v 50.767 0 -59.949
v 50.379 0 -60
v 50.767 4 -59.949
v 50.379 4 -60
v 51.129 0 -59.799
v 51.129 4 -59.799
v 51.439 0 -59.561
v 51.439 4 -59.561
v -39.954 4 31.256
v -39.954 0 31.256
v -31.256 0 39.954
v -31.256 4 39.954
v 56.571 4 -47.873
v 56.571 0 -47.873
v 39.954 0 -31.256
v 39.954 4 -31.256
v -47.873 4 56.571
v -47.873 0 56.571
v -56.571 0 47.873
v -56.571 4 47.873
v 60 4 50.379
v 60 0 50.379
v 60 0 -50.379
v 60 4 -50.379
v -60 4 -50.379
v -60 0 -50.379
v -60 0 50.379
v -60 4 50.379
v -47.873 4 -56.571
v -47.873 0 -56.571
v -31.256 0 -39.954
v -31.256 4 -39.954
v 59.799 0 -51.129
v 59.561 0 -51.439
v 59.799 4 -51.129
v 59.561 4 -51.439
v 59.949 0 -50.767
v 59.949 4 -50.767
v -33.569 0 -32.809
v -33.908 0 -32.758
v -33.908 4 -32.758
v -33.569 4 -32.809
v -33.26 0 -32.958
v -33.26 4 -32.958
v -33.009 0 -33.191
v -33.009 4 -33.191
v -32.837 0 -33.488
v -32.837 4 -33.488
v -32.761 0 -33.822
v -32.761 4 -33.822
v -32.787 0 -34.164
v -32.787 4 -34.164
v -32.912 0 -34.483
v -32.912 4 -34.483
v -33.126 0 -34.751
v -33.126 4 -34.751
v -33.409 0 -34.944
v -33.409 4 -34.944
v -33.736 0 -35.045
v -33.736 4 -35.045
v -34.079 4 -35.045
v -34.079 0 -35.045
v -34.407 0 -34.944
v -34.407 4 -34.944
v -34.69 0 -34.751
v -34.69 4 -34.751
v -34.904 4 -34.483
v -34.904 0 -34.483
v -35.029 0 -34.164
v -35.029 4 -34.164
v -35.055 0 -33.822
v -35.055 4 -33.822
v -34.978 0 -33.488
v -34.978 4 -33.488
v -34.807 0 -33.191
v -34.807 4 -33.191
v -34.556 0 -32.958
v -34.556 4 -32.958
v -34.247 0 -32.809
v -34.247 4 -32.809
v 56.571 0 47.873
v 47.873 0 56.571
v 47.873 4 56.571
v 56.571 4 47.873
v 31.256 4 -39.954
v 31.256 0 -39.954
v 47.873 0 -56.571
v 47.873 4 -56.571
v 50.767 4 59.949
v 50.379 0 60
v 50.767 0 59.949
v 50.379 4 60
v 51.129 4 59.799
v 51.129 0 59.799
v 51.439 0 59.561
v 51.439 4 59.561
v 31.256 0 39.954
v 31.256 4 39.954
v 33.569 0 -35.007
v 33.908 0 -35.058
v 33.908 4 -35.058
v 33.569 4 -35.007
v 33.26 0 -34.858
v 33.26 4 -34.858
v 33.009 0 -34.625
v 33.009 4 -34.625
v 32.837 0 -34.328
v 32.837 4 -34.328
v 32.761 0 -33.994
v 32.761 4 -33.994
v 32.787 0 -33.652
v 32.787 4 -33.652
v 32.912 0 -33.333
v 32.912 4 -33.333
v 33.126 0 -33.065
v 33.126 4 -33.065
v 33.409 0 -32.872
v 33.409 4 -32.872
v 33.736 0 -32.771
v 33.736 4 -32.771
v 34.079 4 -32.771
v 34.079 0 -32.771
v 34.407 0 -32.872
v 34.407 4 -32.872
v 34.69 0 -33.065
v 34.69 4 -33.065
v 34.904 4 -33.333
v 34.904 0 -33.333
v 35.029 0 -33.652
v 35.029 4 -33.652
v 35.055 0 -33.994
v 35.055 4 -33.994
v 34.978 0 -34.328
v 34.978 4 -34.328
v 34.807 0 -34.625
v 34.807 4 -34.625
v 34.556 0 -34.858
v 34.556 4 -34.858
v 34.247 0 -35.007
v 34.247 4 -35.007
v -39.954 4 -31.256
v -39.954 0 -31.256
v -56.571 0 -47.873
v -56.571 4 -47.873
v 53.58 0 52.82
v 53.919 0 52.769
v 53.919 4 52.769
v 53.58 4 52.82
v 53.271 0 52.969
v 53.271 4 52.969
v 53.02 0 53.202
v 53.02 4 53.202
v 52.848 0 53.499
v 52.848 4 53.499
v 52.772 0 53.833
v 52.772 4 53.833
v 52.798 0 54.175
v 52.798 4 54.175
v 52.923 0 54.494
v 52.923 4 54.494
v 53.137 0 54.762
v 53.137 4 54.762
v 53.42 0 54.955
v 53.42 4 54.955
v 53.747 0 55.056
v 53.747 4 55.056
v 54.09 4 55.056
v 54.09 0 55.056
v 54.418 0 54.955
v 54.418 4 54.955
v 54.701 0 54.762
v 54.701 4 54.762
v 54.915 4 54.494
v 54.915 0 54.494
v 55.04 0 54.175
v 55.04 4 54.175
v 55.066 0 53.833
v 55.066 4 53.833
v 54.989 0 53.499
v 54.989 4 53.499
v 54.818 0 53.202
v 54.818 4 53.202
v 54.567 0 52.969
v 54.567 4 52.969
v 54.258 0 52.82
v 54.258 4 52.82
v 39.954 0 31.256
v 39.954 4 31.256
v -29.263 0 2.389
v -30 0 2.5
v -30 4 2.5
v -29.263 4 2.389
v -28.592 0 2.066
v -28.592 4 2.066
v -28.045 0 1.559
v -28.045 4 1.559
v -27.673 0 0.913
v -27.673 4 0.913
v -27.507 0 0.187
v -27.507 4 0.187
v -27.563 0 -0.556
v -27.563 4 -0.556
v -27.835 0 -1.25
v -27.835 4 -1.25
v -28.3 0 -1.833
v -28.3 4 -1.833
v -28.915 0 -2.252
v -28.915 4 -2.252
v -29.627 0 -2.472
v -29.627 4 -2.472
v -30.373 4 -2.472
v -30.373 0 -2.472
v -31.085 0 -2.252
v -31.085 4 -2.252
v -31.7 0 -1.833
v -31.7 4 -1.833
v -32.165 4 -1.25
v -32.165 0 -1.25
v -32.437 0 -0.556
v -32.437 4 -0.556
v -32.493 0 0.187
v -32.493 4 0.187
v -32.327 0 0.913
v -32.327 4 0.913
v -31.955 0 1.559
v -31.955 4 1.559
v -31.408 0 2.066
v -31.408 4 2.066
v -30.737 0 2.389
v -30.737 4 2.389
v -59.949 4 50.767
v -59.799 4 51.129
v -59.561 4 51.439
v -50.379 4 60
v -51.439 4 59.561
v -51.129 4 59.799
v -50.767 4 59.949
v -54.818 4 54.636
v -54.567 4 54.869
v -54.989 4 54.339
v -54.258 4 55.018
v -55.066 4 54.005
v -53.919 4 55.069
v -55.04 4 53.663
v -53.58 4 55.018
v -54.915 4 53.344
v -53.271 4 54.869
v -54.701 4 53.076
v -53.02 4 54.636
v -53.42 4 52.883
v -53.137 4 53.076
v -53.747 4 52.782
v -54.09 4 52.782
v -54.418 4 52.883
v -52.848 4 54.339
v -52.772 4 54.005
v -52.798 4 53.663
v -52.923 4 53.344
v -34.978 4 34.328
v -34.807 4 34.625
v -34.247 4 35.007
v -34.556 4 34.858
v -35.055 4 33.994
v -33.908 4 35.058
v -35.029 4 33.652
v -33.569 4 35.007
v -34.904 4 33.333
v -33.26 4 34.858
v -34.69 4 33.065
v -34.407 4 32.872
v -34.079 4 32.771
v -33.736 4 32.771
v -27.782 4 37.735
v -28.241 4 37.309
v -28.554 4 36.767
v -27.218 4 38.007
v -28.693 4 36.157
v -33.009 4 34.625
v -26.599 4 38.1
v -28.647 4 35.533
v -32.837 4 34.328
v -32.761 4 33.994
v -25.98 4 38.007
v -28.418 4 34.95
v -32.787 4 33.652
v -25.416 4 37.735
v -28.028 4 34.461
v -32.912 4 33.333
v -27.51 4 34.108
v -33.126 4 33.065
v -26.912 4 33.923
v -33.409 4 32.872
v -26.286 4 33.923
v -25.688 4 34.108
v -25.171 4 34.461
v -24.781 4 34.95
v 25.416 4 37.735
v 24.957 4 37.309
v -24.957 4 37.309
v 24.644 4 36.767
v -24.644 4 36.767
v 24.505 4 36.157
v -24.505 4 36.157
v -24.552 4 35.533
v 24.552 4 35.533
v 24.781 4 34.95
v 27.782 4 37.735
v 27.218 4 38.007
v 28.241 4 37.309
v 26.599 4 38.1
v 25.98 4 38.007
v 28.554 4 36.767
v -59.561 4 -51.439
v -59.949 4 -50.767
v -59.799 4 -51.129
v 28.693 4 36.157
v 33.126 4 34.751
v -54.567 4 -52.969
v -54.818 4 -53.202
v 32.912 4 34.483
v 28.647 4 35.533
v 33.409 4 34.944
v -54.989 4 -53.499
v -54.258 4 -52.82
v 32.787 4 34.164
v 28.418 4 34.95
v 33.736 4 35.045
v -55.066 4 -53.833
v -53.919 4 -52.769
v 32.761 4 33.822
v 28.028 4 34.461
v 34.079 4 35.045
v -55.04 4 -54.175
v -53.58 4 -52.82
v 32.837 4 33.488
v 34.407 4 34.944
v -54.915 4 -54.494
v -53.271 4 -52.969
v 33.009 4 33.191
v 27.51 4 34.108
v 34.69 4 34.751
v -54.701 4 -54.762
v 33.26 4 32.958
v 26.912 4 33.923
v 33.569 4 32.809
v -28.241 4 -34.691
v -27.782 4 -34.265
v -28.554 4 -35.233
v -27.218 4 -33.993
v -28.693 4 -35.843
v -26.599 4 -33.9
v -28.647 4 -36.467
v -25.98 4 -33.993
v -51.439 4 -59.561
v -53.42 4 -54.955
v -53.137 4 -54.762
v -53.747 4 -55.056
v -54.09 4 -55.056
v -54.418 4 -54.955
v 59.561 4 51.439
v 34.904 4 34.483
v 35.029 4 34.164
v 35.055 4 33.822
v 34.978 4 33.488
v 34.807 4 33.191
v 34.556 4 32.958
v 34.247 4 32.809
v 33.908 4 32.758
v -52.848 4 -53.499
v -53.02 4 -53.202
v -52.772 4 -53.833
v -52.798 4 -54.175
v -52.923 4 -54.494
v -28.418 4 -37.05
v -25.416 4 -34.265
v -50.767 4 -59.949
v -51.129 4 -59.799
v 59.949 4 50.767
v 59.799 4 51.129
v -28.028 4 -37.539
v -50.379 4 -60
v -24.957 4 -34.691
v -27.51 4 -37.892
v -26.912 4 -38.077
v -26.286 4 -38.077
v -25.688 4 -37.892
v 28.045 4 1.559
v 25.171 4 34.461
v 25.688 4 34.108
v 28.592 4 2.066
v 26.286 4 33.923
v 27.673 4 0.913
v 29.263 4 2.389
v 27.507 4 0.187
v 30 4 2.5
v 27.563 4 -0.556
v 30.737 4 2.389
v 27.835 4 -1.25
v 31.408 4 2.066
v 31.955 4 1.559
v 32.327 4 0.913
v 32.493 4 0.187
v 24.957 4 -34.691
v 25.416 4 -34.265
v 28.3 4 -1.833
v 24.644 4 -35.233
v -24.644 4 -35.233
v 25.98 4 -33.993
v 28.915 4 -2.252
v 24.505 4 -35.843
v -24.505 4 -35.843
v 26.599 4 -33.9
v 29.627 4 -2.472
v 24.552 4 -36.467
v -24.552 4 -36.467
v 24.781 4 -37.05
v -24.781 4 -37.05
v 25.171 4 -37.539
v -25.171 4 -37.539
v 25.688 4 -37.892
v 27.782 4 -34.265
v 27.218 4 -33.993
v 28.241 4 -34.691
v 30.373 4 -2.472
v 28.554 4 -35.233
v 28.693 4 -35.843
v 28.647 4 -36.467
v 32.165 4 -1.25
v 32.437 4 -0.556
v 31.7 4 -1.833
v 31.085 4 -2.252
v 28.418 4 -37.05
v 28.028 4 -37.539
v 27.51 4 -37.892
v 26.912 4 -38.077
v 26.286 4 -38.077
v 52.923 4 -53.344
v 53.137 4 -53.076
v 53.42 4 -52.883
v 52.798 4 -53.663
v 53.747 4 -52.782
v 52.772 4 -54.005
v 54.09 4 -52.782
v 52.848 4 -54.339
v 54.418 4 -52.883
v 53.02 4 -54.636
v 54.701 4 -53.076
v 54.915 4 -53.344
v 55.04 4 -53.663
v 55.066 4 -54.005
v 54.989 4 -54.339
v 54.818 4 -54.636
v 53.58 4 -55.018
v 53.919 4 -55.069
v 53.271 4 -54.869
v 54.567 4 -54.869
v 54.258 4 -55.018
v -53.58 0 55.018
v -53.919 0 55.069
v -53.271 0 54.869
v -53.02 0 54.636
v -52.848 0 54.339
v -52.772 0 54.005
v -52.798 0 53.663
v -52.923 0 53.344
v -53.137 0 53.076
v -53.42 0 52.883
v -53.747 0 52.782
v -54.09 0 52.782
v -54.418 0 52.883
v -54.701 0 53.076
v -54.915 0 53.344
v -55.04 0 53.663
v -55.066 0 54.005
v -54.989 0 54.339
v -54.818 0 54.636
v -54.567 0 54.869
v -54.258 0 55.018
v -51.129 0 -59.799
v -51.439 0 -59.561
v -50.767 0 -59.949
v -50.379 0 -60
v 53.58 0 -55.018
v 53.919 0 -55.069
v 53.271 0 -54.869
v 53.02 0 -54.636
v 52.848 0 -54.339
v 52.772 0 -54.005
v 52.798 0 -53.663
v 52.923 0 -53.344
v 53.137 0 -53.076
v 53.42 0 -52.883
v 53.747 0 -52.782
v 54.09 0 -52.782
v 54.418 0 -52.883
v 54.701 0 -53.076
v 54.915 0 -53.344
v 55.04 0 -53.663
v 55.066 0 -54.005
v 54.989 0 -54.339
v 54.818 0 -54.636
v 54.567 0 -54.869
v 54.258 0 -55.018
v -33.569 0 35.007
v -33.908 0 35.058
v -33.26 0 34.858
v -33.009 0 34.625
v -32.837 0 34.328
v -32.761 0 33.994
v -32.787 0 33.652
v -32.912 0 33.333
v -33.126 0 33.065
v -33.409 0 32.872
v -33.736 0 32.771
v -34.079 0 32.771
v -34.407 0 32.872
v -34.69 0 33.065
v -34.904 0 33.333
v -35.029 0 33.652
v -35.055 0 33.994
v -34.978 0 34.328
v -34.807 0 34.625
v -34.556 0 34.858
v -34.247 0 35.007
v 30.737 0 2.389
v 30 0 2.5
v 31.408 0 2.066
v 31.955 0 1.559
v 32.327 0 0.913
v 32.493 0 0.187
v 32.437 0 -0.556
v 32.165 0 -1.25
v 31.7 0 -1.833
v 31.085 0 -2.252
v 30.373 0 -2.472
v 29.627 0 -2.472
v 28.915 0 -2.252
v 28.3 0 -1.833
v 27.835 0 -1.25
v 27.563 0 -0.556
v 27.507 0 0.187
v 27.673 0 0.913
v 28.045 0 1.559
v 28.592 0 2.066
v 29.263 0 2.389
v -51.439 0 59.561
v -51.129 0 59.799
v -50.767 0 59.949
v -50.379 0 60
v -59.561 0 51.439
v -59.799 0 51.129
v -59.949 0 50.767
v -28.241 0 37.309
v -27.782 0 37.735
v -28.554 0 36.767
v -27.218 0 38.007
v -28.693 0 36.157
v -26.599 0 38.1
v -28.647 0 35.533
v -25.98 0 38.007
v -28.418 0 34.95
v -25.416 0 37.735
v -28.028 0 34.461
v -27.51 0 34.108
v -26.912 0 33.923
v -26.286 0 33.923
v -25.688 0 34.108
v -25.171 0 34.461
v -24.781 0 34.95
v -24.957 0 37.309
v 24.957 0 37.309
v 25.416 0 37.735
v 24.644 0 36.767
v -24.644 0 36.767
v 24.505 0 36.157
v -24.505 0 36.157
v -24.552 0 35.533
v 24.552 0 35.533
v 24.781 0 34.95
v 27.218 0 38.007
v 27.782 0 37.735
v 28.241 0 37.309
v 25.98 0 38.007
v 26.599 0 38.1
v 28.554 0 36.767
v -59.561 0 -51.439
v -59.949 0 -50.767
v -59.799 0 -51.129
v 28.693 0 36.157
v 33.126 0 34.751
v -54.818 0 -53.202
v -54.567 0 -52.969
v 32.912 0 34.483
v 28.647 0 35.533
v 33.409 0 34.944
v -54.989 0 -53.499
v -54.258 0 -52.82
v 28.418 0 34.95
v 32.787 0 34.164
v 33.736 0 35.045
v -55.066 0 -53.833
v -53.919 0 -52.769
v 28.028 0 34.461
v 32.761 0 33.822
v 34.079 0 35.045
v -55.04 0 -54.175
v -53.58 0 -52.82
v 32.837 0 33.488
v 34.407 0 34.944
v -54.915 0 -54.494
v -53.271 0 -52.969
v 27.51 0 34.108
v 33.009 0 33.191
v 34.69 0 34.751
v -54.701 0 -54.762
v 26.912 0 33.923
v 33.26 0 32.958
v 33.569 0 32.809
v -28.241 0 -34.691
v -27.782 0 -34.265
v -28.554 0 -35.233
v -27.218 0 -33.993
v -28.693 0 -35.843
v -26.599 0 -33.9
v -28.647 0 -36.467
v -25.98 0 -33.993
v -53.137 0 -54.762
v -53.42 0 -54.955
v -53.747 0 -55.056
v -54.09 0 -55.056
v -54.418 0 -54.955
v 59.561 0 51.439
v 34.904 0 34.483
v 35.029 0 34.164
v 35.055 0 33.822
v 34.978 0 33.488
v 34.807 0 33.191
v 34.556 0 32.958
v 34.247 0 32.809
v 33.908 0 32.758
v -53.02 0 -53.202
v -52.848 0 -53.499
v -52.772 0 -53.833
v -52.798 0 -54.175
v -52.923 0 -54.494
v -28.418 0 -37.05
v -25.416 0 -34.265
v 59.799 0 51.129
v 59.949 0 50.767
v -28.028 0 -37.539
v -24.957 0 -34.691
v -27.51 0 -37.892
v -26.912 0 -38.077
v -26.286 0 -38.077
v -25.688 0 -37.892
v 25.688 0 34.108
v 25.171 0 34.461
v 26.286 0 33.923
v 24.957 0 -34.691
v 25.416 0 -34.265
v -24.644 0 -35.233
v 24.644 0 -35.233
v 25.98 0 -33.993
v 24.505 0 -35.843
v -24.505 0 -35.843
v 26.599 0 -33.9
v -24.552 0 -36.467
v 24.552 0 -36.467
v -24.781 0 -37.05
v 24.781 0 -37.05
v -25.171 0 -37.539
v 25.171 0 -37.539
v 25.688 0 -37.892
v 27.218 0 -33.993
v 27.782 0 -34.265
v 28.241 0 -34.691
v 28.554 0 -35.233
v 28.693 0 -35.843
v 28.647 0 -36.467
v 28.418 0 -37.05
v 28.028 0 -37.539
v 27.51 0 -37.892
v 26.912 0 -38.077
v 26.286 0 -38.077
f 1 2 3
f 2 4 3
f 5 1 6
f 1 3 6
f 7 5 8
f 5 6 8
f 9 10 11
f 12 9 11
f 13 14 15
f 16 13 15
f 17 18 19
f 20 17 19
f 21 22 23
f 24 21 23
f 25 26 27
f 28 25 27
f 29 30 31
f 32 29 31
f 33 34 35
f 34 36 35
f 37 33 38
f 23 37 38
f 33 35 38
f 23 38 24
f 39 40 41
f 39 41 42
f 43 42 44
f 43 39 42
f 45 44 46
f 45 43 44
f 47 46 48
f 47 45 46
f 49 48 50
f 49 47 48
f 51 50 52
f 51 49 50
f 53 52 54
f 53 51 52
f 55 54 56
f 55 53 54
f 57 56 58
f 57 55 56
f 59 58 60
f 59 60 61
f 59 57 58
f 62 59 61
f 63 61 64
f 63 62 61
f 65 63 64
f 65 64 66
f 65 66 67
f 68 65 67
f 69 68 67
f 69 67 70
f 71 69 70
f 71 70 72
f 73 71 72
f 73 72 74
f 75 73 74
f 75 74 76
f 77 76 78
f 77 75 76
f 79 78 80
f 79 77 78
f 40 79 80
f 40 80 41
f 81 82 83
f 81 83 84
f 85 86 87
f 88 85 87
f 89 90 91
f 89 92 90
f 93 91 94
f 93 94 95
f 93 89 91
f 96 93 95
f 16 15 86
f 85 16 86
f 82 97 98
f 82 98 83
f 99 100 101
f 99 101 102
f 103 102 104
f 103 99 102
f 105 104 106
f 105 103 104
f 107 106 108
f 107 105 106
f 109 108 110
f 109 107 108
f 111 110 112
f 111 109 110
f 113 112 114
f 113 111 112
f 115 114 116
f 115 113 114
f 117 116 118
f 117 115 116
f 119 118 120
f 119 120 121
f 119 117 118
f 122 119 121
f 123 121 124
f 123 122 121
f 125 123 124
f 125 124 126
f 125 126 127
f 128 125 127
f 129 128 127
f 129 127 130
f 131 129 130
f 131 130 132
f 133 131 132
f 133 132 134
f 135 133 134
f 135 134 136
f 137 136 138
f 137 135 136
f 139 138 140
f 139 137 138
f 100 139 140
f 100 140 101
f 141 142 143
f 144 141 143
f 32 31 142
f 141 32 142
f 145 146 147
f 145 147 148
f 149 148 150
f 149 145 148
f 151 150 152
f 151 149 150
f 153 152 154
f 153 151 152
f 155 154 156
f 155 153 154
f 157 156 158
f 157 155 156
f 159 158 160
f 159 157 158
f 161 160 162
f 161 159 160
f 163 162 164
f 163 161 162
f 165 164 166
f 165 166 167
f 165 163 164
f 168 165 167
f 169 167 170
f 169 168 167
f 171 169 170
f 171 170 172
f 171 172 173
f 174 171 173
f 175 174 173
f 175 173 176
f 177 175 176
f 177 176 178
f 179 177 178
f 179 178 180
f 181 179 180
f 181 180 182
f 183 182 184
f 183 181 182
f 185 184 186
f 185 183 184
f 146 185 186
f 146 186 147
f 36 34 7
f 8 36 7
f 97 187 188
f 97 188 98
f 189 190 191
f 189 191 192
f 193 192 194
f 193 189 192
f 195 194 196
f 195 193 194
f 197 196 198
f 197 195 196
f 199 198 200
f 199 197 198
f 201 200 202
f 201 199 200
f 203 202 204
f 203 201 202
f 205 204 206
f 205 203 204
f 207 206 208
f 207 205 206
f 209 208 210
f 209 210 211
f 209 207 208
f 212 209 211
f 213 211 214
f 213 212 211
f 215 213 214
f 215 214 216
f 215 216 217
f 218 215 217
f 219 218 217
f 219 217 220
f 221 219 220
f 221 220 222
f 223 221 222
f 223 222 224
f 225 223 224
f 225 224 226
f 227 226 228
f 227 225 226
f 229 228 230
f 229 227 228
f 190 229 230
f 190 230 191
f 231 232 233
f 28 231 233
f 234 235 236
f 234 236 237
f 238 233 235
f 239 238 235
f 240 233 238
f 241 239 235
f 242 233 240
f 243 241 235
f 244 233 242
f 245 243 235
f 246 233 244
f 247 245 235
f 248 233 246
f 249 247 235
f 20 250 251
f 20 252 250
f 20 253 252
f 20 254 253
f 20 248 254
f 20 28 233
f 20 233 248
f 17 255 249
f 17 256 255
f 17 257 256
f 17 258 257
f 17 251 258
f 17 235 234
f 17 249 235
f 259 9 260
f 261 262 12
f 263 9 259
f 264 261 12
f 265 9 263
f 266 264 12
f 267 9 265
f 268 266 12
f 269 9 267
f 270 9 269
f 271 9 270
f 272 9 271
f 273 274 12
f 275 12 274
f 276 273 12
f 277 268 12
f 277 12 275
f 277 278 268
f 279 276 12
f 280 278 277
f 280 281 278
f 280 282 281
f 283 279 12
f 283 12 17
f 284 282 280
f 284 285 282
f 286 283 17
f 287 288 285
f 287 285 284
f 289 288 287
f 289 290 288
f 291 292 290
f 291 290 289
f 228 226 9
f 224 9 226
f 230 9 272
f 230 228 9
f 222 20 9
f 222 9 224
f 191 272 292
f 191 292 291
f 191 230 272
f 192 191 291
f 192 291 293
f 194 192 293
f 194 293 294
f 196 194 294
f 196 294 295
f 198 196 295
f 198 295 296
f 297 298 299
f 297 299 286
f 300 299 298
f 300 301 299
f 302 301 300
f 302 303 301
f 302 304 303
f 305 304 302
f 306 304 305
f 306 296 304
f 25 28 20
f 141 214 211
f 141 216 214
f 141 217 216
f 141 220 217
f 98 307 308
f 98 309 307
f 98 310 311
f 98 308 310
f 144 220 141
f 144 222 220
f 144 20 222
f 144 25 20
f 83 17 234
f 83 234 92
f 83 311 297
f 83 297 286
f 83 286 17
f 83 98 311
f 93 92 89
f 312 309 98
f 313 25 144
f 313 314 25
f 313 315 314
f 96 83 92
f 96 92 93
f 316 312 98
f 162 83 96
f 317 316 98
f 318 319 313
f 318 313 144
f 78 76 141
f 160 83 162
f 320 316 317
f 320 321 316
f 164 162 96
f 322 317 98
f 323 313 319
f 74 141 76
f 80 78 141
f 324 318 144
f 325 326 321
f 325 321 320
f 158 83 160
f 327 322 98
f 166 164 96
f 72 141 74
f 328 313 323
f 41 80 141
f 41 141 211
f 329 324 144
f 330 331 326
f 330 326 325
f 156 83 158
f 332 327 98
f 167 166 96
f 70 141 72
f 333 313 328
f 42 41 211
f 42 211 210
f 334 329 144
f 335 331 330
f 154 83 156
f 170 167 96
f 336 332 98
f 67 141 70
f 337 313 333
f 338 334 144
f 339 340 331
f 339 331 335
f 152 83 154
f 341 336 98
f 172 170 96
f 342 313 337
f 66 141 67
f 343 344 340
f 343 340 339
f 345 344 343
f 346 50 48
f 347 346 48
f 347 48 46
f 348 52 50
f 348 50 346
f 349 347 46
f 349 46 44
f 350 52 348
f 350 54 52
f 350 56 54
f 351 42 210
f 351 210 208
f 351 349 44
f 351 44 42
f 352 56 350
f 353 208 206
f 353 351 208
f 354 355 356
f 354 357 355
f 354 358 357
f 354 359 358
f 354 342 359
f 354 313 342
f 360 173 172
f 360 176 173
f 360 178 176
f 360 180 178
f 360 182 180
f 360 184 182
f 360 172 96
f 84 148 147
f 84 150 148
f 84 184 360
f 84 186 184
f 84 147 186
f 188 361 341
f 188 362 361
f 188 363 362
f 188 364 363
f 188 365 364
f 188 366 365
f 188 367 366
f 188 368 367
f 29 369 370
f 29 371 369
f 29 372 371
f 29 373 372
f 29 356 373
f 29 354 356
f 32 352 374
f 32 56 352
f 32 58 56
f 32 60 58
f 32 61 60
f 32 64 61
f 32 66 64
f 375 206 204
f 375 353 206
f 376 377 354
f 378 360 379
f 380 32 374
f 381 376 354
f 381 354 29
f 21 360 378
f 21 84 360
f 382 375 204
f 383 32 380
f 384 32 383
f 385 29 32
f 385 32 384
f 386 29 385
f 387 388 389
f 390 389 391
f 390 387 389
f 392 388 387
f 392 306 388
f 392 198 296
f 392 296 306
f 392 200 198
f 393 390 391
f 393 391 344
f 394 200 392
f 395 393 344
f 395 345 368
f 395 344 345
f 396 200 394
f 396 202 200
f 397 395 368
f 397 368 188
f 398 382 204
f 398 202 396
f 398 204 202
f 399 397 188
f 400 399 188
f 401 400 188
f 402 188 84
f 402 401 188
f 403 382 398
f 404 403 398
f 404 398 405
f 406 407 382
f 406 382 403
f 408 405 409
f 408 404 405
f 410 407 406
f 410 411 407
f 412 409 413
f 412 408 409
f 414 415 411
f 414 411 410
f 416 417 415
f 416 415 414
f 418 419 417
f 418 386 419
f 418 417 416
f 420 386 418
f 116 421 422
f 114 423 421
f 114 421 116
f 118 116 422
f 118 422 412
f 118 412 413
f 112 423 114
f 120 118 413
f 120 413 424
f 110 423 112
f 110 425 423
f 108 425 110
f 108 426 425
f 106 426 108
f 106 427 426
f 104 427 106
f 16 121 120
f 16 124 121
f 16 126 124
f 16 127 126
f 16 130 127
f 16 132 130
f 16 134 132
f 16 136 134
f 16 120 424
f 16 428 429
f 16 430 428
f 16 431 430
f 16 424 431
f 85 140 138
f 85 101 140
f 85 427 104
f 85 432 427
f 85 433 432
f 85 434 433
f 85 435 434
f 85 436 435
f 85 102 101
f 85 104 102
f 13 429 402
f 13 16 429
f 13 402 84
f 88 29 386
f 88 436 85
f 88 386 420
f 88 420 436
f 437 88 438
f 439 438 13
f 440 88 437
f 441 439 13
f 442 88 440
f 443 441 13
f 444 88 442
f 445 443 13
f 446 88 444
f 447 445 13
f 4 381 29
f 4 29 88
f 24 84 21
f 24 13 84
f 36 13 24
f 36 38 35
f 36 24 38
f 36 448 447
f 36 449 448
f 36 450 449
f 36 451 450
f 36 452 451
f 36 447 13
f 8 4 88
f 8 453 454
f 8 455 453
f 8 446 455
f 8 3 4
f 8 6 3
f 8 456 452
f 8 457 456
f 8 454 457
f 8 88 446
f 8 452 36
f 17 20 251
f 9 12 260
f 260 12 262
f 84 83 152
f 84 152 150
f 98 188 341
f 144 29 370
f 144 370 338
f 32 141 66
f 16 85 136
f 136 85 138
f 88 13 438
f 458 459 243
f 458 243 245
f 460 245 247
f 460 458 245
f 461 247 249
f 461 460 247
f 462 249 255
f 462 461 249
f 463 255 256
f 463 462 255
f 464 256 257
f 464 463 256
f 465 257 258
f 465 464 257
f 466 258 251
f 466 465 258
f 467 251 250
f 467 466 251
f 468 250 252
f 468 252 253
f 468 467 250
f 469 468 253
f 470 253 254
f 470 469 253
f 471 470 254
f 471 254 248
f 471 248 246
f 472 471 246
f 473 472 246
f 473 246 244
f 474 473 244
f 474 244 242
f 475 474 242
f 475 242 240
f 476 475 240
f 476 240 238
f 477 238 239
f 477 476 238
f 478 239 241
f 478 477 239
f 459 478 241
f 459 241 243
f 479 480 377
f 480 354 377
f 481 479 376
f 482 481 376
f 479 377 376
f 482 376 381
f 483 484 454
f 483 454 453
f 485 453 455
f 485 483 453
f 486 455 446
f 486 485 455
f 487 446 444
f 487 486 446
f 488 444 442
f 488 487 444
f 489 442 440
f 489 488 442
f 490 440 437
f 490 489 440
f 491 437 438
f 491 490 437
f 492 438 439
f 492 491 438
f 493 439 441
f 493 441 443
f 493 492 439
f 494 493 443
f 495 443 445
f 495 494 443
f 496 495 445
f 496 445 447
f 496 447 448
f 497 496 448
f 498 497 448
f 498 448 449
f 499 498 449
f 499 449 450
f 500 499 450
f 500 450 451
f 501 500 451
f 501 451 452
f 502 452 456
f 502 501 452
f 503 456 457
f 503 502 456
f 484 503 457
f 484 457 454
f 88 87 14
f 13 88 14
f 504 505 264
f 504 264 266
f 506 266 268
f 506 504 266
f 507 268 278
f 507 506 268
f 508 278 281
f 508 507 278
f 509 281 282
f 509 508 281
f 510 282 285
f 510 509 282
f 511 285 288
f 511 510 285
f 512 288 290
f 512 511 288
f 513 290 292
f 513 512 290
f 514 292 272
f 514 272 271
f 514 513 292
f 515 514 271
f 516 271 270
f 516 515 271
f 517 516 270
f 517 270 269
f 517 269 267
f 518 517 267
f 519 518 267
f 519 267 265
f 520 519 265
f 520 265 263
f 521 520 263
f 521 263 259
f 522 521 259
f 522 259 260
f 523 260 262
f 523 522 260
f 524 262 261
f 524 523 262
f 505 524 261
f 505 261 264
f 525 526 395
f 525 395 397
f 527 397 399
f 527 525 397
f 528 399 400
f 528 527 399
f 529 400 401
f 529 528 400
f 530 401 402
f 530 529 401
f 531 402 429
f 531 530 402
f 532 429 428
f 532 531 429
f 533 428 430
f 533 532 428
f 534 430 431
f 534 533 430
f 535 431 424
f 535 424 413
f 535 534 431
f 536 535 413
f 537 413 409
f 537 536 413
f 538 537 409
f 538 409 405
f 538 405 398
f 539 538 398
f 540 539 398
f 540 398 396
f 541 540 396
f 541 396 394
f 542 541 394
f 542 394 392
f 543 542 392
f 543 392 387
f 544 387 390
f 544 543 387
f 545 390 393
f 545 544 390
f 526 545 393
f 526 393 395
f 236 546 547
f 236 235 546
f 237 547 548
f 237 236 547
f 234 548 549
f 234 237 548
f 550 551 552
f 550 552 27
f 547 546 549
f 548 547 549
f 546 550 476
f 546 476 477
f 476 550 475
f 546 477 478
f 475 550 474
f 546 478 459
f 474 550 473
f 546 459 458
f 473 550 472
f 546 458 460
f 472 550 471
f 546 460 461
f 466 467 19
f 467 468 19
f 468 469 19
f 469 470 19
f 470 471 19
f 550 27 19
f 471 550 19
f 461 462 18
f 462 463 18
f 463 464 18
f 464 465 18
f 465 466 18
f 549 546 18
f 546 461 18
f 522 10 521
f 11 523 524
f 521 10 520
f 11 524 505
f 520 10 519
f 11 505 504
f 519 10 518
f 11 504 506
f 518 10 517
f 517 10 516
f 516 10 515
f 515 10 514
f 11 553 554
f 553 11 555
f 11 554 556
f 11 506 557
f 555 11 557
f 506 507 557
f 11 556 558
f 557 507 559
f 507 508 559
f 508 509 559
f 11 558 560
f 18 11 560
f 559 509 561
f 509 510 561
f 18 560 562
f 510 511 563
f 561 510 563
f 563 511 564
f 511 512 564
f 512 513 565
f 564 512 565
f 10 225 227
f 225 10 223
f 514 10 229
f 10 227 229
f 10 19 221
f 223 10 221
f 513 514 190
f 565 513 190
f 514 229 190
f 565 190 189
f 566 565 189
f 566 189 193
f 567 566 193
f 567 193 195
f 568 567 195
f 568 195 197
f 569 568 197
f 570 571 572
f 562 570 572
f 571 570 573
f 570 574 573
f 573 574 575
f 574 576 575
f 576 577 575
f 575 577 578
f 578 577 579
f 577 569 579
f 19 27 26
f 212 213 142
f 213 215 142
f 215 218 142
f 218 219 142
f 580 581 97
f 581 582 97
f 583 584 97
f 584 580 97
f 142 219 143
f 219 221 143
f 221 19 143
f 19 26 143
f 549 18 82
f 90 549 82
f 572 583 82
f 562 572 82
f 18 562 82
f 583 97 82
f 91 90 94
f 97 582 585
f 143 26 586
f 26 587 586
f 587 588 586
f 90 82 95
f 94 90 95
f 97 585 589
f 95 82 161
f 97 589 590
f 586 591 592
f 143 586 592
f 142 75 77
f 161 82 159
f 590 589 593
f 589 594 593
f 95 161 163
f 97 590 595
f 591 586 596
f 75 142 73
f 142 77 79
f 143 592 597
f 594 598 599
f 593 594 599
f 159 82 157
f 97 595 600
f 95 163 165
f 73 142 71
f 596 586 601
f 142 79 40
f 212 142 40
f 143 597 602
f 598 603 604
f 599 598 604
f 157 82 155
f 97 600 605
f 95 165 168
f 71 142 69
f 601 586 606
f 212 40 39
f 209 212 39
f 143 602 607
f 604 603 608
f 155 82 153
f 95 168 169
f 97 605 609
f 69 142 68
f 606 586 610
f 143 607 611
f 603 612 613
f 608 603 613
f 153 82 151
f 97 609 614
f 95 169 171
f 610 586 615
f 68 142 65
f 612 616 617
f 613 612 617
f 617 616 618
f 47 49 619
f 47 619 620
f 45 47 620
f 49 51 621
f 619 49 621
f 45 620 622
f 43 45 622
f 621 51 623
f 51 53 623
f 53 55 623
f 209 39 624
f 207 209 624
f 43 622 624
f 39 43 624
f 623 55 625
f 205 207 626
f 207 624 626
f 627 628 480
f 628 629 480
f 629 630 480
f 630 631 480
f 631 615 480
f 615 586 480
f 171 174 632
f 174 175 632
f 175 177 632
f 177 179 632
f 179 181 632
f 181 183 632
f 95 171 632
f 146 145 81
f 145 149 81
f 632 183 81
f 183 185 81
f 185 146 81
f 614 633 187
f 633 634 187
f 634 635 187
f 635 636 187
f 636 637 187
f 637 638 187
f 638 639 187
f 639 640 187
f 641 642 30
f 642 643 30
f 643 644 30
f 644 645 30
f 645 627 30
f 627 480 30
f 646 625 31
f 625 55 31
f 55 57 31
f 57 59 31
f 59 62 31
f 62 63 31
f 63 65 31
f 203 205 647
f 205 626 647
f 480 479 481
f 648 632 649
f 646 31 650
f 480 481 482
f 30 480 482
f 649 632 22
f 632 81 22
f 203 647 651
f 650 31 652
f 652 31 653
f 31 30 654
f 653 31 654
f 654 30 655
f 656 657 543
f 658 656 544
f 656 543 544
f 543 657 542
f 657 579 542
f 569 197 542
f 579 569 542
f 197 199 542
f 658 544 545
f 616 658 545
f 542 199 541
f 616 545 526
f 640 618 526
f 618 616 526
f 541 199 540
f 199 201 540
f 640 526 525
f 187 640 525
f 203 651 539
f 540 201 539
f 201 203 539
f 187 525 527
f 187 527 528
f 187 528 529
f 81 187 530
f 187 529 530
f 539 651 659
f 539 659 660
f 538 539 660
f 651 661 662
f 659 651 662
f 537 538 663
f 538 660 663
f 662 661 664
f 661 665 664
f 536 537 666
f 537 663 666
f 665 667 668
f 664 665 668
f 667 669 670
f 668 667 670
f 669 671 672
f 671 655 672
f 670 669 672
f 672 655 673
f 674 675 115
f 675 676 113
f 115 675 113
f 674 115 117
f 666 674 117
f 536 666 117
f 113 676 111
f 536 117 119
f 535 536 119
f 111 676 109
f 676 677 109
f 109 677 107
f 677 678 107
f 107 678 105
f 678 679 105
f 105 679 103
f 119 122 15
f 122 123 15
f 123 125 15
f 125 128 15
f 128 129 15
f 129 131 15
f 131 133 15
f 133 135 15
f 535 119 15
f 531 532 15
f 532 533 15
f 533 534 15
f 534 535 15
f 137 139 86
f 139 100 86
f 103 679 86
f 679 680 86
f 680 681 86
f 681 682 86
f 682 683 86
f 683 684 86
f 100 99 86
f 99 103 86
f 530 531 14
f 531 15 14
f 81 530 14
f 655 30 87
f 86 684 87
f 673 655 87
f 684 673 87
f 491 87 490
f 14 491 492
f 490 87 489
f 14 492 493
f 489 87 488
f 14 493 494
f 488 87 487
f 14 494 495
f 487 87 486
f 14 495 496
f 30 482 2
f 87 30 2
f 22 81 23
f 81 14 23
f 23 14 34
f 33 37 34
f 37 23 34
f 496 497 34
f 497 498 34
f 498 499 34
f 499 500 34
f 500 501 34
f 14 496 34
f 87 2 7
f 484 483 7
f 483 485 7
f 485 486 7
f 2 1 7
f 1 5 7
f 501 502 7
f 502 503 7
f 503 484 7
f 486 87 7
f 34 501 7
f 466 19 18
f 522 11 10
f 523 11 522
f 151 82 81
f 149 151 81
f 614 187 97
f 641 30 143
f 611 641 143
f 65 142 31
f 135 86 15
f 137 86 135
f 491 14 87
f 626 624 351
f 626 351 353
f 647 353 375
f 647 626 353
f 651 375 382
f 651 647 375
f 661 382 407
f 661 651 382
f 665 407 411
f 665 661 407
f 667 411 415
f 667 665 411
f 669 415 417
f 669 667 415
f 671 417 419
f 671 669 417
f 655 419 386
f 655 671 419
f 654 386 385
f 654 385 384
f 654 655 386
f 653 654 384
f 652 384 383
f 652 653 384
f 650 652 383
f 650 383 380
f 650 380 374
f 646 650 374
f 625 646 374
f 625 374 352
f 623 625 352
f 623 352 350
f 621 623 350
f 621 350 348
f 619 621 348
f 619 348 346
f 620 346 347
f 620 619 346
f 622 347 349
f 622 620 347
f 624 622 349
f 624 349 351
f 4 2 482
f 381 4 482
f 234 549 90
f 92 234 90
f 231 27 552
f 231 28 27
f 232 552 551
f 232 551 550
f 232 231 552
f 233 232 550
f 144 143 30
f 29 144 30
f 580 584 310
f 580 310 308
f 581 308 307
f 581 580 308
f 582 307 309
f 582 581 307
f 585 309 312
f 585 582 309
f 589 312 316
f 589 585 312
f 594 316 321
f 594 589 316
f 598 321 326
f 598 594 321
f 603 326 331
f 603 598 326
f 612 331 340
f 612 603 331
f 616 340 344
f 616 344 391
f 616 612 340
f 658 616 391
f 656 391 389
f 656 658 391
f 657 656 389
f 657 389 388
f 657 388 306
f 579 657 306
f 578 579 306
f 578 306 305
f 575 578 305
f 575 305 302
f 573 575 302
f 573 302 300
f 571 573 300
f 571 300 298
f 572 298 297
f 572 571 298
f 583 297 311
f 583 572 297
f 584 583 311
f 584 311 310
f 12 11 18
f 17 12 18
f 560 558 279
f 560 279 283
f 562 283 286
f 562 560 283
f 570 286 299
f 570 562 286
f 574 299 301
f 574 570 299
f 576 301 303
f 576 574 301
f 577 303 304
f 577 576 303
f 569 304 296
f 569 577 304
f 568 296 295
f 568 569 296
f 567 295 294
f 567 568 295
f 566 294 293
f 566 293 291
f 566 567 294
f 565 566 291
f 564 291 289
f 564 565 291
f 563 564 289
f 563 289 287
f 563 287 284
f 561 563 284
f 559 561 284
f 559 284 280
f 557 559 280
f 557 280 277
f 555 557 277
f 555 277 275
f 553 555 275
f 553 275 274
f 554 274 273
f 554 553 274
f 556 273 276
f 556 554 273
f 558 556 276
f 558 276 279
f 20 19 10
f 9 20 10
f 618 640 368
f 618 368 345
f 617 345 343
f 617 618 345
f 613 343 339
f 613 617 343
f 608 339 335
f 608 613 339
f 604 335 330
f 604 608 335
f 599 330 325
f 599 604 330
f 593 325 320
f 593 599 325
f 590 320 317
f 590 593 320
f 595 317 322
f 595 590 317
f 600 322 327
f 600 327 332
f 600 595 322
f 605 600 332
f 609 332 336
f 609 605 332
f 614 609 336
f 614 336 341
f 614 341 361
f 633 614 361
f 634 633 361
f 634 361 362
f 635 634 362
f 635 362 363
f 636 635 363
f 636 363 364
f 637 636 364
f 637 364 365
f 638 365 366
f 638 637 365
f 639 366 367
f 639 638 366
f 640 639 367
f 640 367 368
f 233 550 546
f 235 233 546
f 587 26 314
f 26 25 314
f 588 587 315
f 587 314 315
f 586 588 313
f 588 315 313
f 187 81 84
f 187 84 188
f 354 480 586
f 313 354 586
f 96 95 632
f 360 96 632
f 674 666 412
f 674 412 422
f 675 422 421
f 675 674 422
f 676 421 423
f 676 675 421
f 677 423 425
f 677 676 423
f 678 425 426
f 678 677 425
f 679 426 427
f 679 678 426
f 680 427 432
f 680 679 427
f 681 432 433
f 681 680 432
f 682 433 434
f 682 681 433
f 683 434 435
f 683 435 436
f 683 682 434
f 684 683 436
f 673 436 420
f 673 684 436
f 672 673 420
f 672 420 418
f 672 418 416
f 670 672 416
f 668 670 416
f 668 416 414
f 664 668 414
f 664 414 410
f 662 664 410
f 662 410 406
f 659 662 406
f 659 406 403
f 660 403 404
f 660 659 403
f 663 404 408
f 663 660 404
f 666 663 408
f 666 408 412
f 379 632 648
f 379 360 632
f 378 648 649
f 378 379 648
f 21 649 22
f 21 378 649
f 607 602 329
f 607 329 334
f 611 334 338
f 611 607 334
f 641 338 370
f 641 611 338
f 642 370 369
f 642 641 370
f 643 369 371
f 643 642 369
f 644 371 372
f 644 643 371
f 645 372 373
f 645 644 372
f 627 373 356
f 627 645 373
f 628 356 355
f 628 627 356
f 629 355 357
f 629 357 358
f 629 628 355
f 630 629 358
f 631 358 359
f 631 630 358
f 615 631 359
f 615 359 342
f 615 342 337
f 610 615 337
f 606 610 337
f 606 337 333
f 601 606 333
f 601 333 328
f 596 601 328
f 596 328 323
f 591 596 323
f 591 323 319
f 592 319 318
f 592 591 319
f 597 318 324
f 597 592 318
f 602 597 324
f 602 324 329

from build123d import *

# Parameters (mm, degrees)
SKETCH1_R           = 1.15
SKETCH1_R_2         = 2.5
SKETCH1_R_3         = 2.1
BOSS_EXTRUDE1_DEPTH = 4
FILLET1_R           = 1.5


with BuildPart() as part:
    # Sketch1 → Boss-Extrude1 (new body)
    with BuildSketch(Plane(origin=(0, 0, 0), x_dir=(1, 0, 0), z_dir=(0, 1, 0))):
        Polygon((-60, 51), (-60, -51), (-51, -60), (51, -60), (60, -51), (60, 51), (51, 60), (-51, 60), align=None)
        with Locations(Location((-53.918881682, 53.918881682, 0), (0, 0, 270))):
            Circle(SKETCH1_R, mode=Mode.SUBTRACT)
        with Locations(Location((-33.907759774, 33.907759774, 0), (0, 0, 270))):
            Circle(SKETCH1_R, mode=Mode.SUBTRACT)
        with Locations(Location((33.907759774, 33.907759774, 0), (0, 0, 90))):
            Circle(SKETCH1_R, mode=Mode.SUBTRACT)
        with Locations(Location((53.918881682, 53.918881682, 0), (0, 0, 90))):
            Circle(SKETCH1_R, mode=Mode.SUBTRACT)
        with Locations(Location((-53.918881682, -53.918881682, 0), (0, 0, 270))):
            Circle(SKETCH1_R, mode=Mode.SUBTRACT)
        with Locations(Location((-33.907759774, -33.907759774, 0), (0, 0, 270))):
            Circle(SKETCH1_R, mode=Mode.SUBTRACT)
        with Locations(Location((53.918881682, -53.918881682, 0), (0, 0, 90))):
            Circle(SKETCH1_R, mode=Mode.SUBTRACT)
        with Locations(Location((33.907759774, -33.907759774, 0), (0, 0, 90))):
            Circle(SKETCH1_R, mode=Mode.SUBTRACT)
        with Locations(Location((-30, 0, 0), (0, 0, 270))):
            Circle(SKETCH1_R_2, mode=Mode.SUBTRACT)
        with Locations(Location((30, 0, 0), (0, 0, 270))):
            Circle(SKETCH1_R_2, mode=Mode.SUBTRACT)
        with Locations(Location((26.599203711, 36, 0), (0, 0, 270))):
            Circle(SKETCH1_R_3, mode=Mode.SUBTRACT)
        with Locations(Location((26.599203711, -36, 0), (0, 0, 270))):
            Circle(SKETCH1_R_3, mode=Mode.SUBTRACT)
        with Locations(Location((-26.599203711, -36, 0), (0, 0, 270))):
            Circle(SKETCH1_R_3, mode=Mode.SUBTRACT)
        with Locations(Location((-26.599203711, 36, 0), (0, 0, 270))):
            Circle(SKETCH1_R_3, mode=Mode.SUBTRACT)
        Polygon((-56.570532111, 47.873118703), (-47.873118703, 56.570532111), (-31.256109345, 39.953522753), (-39.953522753, 31.256109345), align=None, mode=Mode.SUBTRACT)
        Polygon((39.953522753, 31.256109345), (31.256109345, 39.953522753), (47.873118703, 56.570532111), (56.570532111, 47.873118703), align=None, mode=Mode.SUBTRACT)
        Polygon((-47.873118703, -56.570532111), (-56.570532111, -47.873118703), (-39.953522753, -31.256109345), (-31.256109345, -39.953522753), align=None, mode=Mode.SUBTRACT)
        Polygon((47.873118703, -56.570532111), (56.570532111, -47.873118703), (39.953522753, -31.256109345), (31.256109345, -39.953522753), align=None, mode=Mode.SUBTRACT)
    extrude(amount=BOSS_EXTRUDE1_DEPTH)

    # Fillet1
    fillet1_edges = [part.edges().sort_by_distance(p)[0] for p in [
        (51, 2, -60),
        (60, 2, -51),
        (60, 2, 51),
        (51, 2, 60),
        (-51, 2, 60),
        (-60, 2, 51),
        (-60, 2, -51),
        (-51, 2, -60),
    ]]
    fillet(fillet1_edges, radius=FILLET1_R)


solid = part.part
